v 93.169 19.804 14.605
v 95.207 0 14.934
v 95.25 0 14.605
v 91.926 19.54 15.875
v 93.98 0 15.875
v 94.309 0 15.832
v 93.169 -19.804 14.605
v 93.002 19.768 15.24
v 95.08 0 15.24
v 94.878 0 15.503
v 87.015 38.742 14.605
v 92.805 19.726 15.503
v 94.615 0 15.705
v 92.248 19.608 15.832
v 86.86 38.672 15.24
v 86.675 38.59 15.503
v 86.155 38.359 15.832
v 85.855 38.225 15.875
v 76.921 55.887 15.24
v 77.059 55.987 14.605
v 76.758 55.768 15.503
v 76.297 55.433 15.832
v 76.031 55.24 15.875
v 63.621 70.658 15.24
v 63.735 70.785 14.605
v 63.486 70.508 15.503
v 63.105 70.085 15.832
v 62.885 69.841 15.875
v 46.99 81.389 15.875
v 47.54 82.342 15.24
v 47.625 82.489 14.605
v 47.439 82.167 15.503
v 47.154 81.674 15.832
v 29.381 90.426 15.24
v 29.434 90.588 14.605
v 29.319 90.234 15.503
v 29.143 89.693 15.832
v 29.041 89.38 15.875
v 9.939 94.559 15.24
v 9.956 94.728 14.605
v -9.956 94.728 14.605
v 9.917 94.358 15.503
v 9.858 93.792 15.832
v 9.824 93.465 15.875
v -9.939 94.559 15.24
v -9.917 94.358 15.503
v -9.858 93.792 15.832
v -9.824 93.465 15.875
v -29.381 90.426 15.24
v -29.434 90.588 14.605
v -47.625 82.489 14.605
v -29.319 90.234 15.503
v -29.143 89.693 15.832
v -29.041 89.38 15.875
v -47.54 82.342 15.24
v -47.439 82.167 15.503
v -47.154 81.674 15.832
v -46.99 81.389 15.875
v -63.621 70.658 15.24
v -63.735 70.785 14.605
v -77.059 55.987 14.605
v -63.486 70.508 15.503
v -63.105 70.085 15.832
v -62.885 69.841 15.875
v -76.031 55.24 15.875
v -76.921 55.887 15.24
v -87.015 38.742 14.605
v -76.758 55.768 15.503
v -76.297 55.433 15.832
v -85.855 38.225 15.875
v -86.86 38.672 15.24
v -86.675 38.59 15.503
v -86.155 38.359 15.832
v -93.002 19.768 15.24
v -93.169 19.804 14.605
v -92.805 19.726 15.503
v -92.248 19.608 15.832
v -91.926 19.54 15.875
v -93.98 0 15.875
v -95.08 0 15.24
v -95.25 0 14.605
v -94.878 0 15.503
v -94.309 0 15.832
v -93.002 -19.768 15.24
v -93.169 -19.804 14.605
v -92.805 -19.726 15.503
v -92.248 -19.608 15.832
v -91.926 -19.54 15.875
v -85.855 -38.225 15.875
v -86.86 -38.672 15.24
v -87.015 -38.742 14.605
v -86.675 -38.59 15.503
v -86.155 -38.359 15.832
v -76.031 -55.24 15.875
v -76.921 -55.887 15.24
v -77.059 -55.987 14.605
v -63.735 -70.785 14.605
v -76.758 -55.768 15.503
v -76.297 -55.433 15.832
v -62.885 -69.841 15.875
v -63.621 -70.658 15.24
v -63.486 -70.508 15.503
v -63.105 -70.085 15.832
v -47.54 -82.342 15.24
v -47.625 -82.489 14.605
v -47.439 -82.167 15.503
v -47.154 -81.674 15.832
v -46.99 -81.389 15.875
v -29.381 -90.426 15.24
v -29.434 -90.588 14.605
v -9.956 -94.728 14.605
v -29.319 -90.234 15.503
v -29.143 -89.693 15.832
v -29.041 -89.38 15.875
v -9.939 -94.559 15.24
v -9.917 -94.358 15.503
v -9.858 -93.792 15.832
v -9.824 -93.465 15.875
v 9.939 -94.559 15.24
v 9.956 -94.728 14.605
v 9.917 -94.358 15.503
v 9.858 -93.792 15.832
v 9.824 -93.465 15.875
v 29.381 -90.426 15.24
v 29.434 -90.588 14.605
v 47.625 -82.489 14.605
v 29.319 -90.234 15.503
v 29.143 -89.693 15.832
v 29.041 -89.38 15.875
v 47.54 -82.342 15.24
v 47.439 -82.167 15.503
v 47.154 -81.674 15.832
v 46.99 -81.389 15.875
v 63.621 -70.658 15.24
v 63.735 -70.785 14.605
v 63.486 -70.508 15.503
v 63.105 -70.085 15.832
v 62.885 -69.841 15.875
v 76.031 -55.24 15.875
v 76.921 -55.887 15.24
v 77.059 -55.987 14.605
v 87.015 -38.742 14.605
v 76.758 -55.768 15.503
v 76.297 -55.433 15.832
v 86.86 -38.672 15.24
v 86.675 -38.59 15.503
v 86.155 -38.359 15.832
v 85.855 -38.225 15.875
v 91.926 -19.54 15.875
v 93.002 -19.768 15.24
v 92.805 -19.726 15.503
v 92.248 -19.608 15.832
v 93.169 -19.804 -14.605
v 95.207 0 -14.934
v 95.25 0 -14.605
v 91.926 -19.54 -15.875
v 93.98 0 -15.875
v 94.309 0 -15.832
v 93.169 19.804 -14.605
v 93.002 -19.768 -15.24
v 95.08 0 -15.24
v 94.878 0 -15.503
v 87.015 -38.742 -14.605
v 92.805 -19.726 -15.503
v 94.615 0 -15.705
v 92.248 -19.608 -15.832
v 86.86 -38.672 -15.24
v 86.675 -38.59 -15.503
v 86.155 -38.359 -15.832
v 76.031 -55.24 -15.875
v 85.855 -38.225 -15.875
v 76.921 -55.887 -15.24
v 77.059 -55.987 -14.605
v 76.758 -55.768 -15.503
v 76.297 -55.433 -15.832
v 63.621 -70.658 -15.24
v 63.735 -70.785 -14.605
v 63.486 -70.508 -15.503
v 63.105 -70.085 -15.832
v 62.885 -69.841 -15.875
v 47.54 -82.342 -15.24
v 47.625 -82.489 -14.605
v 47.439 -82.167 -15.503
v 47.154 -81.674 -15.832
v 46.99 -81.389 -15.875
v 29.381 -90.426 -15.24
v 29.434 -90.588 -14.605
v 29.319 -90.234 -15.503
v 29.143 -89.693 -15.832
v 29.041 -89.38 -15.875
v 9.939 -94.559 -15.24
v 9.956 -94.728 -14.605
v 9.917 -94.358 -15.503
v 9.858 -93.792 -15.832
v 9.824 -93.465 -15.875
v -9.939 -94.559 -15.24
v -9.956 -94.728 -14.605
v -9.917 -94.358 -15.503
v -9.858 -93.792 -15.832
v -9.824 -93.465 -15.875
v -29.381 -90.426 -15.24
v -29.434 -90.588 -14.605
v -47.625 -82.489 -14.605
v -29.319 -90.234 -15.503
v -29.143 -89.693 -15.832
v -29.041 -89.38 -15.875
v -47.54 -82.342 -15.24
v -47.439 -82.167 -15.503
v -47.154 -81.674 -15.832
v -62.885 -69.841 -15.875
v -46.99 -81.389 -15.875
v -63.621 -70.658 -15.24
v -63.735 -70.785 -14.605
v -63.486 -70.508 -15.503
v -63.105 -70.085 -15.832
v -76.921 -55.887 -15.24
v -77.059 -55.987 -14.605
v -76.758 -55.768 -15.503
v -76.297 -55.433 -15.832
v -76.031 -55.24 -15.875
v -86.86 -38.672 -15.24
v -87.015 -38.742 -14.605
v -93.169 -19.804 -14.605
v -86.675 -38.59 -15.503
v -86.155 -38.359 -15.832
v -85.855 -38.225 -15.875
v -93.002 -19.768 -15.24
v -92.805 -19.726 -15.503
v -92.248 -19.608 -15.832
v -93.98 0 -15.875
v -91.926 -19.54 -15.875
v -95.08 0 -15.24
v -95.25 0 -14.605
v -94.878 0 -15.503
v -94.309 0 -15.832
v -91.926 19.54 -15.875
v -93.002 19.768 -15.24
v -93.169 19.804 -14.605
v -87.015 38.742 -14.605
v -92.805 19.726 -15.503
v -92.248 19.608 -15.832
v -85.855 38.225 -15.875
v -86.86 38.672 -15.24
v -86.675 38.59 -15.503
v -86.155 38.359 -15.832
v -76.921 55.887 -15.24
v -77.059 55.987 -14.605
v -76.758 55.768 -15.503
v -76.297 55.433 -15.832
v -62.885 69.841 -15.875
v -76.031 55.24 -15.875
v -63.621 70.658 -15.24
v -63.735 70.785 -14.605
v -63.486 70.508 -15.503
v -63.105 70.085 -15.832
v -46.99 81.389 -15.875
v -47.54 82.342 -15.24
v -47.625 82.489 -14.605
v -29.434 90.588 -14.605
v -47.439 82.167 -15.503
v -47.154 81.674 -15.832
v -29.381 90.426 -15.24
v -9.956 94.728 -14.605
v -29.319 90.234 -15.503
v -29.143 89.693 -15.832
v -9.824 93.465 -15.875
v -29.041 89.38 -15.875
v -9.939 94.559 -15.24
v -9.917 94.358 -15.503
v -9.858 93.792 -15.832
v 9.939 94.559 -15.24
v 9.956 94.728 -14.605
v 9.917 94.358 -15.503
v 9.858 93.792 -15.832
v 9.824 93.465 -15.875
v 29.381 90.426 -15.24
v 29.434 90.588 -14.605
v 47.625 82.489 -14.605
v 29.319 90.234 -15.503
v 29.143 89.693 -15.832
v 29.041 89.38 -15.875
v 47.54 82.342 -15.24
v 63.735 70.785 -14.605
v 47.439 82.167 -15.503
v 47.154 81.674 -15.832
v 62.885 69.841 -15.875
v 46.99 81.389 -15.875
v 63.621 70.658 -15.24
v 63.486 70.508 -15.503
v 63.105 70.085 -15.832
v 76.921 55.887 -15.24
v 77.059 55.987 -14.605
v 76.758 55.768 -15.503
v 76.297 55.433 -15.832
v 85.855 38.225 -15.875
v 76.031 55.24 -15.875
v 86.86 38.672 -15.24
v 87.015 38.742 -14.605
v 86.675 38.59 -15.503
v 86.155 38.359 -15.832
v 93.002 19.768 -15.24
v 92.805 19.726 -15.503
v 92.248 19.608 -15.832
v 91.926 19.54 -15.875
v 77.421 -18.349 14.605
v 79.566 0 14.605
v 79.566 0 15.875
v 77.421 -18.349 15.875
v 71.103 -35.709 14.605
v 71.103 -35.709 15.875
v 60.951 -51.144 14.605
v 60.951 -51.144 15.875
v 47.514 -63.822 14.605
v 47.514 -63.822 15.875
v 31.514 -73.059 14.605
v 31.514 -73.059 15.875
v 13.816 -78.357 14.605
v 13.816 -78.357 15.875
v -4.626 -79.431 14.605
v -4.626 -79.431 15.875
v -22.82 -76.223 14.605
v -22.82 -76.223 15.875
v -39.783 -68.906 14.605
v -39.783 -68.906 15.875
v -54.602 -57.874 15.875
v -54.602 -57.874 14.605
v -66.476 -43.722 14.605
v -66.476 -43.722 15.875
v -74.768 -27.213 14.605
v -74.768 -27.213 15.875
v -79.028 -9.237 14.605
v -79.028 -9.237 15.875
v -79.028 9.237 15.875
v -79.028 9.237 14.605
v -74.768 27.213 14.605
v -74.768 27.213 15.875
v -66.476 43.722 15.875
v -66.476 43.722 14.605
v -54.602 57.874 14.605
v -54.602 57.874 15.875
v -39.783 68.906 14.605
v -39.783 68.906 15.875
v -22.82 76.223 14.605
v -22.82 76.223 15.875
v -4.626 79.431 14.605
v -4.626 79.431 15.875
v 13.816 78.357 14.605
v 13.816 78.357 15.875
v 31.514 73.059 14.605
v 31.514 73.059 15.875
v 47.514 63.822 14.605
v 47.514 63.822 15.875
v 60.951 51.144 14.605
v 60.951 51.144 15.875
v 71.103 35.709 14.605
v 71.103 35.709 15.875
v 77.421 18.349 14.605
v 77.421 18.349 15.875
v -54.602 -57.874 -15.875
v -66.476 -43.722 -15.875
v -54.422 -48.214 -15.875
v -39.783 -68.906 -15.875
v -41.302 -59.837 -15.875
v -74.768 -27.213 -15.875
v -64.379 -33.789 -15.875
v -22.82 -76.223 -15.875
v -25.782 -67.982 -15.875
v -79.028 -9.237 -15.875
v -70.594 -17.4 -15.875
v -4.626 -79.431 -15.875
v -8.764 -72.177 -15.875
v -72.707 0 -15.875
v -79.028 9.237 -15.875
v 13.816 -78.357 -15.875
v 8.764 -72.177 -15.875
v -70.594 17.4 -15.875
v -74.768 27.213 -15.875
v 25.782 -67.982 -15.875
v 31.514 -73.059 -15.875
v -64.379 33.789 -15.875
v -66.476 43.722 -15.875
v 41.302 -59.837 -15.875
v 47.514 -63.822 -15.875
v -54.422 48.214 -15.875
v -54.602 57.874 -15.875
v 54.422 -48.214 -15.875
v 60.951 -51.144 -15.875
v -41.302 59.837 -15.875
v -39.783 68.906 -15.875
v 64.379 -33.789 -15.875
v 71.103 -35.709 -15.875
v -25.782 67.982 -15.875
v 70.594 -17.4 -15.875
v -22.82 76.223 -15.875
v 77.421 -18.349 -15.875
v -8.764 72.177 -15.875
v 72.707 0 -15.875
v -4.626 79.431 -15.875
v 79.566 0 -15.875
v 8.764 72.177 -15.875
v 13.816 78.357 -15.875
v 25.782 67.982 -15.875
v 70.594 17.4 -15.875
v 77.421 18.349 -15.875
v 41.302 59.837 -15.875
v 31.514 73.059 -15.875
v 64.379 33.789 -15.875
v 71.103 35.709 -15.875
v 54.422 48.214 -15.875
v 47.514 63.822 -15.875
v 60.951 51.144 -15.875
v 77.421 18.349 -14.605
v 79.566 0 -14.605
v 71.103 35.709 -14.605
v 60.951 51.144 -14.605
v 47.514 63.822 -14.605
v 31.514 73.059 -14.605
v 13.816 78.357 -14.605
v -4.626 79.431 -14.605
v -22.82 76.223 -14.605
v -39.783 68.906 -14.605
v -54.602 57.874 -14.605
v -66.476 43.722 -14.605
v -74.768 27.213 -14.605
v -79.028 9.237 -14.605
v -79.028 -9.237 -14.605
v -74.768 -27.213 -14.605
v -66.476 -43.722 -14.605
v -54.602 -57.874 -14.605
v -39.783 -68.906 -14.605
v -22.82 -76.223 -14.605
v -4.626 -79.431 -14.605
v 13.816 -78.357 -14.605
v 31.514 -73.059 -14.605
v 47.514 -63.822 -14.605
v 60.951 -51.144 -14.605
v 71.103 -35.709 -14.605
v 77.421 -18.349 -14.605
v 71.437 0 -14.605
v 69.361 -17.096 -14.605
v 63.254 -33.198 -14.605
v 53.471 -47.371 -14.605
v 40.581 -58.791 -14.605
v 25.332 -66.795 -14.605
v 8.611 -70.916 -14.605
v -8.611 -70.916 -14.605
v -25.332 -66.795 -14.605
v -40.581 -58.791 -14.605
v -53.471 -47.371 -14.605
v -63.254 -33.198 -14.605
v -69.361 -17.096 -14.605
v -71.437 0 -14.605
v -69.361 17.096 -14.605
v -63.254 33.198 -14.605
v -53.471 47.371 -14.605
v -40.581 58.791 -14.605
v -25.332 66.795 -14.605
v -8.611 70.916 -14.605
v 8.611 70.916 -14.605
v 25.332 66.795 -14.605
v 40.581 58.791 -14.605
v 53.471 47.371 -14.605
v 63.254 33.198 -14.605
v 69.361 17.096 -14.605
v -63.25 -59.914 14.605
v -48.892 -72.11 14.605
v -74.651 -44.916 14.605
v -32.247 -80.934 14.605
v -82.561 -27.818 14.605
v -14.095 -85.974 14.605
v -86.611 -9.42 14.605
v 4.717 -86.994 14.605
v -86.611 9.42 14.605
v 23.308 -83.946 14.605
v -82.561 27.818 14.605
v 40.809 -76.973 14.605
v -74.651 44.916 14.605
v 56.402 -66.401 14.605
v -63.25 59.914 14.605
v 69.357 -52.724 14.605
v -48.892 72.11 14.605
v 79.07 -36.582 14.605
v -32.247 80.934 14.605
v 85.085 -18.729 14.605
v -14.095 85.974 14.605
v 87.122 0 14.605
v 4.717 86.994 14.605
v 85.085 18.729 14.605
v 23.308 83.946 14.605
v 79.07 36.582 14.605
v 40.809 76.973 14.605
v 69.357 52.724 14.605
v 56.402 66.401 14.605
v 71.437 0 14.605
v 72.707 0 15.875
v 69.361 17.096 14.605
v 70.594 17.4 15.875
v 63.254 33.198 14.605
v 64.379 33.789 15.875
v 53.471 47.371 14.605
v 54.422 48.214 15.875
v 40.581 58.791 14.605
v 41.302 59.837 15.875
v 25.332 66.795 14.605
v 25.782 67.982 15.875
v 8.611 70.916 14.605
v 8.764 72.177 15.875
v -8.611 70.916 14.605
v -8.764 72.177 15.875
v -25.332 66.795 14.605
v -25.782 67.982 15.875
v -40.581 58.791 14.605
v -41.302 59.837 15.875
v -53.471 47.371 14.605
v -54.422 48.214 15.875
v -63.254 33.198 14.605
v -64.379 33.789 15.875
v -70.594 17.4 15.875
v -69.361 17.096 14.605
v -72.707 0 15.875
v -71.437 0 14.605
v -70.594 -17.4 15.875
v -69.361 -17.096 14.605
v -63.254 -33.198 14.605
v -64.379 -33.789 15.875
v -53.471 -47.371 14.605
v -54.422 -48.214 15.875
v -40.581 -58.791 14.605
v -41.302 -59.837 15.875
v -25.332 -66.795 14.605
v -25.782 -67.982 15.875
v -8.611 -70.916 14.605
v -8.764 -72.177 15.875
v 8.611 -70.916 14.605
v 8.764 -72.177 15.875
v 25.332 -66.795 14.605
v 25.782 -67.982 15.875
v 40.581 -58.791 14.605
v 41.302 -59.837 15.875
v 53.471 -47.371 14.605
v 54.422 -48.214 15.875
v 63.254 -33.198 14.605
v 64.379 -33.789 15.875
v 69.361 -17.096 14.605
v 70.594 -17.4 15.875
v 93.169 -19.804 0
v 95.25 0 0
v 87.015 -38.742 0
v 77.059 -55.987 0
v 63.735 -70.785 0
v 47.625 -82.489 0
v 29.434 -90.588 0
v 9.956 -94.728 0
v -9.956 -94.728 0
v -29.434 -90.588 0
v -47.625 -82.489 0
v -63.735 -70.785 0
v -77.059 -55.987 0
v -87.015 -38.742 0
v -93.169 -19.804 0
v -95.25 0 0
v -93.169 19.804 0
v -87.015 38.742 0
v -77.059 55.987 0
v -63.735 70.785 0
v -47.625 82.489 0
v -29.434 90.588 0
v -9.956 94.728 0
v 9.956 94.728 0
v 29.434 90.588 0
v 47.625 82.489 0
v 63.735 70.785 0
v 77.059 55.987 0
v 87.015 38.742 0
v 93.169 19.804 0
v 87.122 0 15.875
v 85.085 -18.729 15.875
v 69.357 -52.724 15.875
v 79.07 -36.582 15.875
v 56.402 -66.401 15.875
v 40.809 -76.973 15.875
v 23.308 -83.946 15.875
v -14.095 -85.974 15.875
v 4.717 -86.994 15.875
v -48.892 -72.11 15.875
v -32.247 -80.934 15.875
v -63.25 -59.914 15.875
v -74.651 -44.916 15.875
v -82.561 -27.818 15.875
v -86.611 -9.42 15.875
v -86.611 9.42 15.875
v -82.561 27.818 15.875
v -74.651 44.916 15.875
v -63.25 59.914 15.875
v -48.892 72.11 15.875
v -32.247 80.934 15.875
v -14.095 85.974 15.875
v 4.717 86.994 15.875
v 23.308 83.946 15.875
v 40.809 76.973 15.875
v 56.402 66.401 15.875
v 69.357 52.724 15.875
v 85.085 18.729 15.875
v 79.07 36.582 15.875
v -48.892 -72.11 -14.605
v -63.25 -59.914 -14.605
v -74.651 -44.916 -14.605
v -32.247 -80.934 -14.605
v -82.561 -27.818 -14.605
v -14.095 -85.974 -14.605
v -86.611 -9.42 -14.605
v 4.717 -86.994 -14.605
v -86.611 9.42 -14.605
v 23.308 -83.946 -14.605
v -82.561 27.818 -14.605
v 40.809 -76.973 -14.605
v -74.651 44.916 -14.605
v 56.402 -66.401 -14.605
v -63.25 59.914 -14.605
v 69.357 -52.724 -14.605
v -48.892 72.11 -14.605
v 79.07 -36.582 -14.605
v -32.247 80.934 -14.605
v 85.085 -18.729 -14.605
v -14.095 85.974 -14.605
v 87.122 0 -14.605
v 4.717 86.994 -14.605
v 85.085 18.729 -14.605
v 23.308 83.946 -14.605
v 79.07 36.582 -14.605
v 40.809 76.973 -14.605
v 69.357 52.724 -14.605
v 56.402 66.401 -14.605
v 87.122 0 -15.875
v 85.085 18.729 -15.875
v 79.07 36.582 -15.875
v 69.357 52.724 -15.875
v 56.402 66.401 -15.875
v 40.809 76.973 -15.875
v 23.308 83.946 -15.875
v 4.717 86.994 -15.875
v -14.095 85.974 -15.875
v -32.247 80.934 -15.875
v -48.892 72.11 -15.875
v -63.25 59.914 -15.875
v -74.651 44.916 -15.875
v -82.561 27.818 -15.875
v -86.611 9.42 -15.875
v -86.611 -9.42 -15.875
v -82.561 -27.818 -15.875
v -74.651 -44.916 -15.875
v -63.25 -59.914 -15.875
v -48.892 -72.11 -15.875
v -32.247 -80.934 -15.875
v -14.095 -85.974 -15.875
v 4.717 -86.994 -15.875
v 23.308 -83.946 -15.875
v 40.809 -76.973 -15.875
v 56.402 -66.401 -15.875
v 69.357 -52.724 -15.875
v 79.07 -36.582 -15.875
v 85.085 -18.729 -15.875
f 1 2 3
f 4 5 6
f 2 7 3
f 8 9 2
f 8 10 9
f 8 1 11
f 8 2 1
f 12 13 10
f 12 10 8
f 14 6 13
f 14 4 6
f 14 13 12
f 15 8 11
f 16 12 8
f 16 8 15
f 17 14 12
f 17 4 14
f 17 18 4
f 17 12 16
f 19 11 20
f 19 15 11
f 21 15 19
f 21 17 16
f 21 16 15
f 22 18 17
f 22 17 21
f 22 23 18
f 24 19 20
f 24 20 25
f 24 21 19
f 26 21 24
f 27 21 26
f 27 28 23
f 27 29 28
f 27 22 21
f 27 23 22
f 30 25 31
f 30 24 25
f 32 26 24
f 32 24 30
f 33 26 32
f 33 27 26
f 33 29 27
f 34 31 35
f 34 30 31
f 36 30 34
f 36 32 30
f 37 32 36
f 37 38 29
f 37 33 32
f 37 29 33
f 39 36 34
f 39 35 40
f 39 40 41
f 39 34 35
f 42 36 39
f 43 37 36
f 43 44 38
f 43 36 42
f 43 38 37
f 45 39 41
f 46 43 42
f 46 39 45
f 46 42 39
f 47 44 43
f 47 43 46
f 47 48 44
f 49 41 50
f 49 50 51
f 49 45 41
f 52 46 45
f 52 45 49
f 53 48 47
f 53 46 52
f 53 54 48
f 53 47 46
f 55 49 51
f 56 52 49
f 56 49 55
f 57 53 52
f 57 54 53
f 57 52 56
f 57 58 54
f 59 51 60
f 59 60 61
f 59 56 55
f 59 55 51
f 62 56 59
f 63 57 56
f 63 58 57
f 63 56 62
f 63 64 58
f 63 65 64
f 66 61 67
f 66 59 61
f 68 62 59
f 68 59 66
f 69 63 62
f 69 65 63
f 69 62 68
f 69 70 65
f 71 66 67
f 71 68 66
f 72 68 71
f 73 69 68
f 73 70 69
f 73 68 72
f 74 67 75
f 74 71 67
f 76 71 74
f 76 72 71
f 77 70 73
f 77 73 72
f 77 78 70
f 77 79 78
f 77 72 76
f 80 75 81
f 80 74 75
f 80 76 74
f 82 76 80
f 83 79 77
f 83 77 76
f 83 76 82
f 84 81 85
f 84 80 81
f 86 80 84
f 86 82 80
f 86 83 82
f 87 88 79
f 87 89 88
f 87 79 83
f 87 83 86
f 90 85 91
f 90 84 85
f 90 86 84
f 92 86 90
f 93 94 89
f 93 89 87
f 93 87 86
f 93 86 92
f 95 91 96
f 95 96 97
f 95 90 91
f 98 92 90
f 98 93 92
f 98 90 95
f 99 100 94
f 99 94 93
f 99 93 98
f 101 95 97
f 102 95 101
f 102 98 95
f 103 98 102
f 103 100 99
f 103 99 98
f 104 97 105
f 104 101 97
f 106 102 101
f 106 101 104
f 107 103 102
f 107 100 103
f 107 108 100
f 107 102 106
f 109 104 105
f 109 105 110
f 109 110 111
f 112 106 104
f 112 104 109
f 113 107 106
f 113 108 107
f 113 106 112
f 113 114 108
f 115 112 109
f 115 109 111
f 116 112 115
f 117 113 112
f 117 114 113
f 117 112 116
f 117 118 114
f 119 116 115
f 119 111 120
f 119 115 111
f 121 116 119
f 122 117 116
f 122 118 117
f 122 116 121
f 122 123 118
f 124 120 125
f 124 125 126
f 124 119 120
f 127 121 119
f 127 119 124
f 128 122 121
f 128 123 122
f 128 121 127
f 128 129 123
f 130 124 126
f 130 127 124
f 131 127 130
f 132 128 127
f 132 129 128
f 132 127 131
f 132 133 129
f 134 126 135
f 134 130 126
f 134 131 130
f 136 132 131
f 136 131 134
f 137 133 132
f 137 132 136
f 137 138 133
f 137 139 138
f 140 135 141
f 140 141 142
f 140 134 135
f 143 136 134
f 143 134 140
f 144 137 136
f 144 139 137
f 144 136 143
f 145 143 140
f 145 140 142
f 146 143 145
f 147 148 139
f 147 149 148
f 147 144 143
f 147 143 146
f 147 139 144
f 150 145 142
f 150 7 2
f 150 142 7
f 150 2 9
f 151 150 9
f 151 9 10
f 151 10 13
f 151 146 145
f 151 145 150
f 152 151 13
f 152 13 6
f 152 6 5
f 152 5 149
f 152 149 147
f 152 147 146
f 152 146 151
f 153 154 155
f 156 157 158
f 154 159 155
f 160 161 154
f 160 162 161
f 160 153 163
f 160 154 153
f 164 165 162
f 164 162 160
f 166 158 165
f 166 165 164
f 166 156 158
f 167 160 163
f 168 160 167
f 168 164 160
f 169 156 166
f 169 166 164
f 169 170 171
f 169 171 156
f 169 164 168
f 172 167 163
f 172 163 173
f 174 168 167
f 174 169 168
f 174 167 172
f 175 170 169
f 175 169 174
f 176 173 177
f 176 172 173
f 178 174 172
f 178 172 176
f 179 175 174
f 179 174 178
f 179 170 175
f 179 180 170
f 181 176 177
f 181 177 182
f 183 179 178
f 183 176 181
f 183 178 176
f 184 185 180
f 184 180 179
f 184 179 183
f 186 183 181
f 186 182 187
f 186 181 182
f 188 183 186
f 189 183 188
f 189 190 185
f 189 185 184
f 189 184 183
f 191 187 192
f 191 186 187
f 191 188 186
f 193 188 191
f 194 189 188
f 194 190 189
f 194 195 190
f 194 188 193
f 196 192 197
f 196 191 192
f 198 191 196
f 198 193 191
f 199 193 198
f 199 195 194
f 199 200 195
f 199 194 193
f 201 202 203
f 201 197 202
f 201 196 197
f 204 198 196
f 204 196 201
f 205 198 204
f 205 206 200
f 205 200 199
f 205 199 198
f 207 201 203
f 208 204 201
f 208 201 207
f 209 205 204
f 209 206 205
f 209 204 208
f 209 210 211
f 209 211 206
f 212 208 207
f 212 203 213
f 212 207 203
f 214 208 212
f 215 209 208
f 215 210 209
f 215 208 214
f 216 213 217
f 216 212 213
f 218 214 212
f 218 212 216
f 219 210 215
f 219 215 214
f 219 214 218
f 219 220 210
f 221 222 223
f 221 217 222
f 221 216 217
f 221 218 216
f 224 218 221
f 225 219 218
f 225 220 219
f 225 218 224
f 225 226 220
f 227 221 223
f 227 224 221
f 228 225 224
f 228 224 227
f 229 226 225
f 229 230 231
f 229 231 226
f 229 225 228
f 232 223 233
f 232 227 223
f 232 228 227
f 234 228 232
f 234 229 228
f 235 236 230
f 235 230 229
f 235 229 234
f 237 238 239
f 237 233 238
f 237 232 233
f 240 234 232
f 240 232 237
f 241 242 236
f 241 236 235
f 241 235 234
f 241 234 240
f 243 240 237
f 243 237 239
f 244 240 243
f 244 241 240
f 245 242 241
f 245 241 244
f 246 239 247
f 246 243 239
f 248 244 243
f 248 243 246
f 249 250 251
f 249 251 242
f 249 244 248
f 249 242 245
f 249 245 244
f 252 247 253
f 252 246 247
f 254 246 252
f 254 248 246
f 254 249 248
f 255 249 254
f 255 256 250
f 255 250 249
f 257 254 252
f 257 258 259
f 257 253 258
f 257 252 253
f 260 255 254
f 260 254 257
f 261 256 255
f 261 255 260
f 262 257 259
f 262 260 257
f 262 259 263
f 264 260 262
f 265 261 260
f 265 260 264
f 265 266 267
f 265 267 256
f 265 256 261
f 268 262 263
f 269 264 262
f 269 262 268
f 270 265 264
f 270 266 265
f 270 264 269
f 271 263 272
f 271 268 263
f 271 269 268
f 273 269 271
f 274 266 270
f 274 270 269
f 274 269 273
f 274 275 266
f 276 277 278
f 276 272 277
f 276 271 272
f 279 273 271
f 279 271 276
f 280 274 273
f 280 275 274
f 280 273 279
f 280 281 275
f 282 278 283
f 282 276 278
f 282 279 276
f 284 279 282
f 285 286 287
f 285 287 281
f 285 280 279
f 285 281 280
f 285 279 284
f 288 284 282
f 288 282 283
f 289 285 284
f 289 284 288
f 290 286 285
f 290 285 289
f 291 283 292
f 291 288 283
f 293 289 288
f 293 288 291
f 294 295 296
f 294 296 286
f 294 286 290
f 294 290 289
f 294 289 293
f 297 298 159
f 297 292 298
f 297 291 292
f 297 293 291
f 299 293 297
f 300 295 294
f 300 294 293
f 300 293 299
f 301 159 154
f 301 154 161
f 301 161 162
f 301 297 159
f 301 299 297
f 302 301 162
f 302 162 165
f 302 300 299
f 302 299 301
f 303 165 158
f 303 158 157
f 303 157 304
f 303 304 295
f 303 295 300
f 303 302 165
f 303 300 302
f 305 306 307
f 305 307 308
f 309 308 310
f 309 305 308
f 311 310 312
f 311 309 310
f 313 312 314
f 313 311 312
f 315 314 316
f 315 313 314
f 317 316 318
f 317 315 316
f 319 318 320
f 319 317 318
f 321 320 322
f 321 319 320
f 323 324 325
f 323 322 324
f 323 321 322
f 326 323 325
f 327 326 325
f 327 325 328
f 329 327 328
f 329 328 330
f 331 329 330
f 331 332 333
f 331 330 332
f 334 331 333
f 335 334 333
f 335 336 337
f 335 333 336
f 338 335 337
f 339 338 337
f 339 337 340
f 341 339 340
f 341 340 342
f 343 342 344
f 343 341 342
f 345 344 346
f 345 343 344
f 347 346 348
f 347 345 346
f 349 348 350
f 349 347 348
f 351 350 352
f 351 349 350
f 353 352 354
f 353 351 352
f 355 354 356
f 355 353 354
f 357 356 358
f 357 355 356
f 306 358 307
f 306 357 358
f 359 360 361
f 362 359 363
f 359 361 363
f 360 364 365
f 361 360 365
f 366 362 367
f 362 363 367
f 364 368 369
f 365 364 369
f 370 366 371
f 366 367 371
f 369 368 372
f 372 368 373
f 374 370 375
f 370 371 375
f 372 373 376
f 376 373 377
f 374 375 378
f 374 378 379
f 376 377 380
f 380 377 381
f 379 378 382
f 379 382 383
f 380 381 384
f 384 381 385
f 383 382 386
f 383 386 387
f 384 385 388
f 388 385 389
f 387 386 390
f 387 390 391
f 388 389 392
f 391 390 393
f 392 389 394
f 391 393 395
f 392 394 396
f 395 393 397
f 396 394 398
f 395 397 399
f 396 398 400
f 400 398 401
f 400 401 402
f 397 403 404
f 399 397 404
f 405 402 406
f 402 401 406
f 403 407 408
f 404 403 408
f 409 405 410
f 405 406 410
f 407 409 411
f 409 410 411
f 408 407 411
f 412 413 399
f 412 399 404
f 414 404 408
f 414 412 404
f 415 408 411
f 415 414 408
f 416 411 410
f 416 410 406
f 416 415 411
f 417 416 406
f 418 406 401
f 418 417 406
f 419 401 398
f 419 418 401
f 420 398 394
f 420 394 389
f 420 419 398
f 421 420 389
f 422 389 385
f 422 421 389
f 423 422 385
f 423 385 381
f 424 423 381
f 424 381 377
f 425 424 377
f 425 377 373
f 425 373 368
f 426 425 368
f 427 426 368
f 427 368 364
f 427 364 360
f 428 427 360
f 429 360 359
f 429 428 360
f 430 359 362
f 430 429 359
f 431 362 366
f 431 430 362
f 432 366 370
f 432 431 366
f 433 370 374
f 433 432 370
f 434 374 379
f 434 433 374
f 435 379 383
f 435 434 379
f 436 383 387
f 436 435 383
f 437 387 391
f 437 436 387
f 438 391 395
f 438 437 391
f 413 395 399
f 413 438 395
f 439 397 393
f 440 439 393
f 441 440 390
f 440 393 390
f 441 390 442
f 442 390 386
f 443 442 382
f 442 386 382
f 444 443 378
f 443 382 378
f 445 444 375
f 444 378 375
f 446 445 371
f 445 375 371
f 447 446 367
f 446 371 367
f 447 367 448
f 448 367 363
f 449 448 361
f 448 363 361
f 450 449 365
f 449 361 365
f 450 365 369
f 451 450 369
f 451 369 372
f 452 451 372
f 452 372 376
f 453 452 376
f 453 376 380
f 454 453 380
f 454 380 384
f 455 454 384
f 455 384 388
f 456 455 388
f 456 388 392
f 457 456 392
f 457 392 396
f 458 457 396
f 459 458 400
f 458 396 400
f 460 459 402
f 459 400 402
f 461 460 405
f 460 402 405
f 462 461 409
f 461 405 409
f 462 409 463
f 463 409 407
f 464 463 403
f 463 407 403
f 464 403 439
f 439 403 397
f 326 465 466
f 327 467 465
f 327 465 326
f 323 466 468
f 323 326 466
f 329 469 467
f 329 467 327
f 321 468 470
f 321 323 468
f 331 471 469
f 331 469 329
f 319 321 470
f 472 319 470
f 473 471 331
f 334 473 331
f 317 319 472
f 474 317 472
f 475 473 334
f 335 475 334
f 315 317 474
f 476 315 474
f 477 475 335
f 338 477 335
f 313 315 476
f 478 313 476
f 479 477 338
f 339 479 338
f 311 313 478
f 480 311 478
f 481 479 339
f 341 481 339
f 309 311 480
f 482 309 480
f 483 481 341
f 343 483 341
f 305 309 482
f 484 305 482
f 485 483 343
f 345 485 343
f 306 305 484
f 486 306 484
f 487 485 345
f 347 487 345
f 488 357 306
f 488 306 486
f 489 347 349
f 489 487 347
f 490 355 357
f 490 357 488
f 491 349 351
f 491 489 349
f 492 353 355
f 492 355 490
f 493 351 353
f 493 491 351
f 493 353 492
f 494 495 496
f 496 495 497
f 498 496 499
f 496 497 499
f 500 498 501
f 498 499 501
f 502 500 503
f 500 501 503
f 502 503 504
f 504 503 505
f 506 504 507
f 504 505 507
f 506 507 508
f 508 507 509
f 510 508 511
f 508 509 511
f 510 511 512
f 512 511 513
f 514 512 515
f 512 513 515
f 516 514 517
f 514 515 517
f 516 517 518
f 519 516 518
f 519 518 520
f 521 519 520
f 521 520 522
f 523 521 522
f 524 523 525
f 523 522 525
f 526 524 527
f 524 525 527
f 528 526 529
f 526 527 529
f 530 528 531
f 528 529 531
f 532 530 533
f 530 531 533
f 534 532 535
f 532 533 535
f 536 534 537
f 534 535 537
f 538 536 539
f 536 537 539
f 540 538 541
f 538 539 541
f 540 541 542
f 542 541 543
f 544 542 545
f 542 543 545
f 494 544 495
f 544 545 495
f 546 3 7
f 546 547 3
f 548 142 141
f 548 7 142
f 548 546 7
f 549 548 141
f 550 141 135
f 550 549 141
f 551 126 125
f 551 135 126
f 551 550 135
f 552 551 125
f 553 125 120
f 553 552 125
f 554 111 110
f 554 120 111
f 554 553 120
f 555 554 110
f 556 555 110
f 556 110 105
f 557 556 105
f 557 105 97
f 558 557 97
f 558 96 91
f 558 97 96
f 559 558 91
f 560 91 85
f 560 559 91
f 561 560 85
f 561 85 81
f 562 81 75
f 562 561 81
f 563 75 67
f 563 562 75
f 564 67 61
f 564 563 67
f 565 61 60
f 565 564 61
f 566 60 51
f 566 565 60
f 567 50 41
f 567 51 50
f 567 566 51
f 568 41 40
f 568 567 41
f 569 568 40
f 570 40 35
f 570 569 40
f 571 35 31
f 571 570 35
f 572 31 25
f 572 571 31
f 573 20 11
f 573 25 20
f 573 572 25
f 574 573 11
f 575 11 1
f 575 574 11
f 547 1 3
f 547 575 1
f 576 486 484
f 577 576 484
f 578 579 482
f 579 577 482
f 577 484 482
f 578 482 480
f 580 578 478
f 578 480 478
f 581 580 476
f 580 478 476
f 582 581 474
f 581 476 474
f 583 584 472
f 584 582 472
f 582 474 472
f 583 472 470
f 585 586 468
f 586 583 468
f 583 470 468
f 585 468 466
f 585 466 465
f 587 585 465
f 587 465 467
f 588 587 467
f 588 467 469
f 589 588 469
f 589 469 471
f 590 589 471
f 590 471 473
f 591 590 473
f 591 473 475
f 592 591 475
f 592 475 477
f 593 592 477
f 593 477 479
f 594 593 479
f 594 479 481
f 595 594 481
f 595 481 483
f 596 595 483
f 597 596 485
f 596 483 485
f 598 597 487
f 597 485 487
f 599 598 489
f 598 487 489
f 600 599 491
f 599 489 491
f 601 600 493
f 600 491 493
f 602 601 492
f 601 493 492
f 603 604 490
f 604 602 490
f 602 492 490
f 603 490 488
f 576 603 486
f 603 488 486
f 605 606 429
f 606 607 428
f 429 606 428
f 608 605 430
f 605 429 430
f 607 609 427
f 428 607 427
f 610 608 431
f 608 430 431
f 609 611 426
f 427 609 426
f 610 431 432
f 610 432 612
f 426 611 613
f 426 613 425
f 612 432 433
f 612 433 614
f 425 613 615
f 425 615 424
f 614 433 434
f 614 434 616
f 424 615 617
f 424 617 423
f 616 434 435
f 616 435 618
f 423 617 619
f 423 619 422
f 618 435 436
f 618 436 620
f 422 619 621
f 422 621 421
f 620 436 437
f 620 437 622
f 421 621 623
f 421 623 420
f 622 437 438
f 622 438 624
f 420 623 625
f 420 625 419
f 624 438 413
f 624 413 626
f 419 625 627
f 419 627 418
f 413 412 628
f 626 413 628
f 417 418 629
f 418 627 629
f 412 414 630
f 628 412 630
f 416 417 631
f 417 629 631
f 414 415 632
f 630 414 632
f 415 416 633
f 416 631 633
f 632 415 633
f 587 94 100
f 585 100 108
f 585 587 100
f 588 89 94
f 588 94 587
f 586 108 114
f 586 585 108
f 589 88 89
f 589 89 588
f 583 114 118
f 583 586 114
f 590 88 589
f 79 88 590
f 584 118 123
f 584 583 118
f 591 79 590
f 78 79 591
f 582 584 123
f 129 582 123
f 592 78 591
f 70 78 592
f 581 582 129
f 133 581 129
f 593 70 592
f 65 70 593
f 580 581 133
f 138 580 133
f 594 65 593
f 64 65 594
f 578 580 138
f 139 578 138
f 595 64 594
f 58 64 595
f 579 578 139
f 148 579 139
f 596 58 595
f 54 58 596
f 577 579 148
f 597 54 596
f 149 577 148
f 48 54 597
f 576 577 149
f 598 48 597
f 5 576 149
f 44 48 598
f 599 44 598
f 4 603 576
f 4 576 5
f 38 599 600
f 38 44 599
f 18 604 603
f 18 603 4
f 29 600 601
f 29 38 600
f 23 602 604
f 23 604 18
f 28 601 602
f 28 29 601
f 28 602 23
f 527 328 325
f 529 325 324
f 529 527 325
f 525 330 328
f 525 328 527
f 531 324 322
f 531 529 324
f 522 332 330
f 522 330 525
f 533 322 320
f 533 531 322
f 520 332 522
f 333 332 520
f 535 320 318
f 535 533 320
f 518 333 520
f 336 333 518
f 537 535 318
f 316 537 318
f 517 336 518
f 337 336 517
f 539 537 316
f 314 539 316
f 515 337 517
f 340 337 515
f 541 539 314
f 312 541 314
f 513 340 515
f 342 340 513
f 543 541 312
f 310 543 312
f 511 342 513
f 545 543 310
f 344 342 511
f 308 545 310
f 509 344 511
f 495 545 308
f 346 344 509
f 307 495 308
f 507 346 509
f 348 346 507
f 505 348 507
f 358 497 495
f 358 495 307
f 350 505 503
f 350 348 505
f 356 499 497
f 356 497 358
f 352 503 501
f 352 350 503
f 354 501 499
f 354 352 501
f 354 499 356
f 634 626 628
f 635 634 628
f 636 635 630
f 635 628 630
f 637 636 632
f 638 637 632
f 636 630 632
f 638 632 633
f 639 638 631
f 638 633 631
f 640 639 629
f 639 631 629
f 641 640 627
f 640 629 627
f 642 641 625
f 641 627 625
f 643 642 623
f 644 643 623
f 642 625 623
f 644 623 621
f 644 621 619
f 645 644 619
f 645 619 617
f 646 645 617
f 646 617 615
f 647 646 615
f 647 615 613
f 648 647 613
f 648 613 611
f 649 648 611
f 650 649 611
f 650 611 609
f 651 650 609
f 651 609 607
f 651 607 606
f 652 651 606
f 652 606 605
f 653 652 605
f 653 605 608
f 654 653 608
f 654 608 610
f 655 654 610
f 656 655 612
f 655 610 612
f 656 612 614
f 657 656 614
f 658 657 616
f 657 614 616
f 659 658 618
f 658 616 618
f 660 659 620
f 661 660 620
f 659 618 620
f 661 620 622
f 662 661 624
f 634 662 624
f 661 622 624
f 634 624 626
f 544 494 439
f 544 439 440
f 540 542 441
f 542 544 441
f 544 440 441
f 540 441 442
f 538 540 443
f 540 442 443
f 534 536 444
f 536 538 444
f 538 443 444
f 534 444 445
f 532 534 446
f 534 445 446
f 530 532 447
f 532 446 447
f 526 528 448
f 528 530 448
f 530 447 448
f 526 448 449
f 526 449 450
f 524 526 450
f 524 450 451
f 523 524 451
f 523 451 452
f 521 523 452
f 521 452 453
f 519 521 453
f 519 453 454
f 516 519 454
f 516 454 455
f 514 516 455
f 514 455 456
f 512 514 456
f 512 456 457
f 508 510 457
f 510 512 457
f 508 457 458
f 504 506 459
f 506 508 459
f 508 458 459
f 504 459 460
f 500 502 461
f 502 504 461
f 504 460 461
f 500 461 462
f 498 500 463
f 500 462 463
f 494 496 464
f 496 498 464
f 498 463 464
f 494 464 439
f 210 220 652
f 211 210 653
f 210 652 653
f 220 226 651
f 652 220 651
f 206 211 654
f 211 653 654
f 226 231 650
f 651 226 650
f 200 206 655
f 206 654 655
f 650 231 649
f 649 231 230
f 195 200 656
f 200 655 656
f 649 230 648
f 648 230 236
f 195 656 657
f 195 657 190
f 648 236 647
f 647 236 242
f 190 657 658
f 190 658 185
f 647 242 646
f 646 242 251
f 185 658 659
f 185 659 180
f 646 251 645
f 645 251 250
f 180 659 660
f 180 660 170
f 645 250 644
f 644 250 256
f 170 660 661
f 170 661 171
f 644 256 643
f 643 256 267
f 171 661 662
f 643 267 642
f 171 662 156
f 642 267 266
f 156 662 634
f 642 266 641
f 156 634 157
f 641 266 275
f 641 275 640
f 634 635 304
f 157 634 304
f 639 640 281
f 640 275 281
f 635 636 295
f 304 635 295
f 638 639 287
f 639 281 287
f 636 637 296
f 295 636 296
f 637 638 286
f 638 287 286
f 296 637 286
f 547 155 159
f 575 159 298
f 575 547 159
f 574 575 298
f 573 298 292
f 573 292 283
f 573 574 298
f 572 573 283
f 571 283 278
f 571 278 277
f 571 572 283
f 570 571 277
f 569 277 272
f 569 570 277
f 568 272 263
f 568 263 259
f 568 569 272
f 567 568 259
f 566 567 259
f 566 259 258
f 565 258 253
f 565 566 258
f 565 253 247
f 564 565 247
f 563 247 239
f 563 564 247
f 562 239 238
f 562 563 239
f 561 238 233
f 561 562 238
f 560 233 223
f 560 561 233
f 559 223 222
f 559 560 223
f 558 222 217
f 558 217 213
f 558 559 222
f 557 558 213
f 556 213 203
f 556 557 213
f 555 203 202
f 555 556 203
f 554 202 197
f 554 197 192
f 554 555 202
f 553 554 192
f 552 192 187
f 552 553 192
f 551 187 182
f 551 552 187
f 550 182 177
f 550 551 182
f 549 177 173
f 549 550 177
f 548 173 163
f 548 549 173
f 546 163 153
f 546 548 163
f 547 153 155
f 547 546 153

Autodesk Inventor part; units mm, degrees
ref_plane "YZ Plane" through (0, 0, 0) normal (1, 0, 0) x (0, 1, 0)
ref_plane "XZ Plane" through (0, 0, 0) normal (0, 1, 0) x (-1, 0, 0)
ref_plane "XY Plane" through (0, 0, 0) normal (0, 0, 1) x (1, 0, 0)
sketch "Sketch1" plane through (0, 0, 0) normal (0, 0, 1) x (1, 0, 0)
  circle A0 centre (0, 0) radius 7.1437
  circle A1 centre (0, 0) radius 9.525
  circle A2 centre (0, 0) radius 7.9566
  circle A3 centre (0, 0) radius 8.7122
  dimension "d0" = 14.2875
  dimension "d1" = 19.05
  dimension "d2" = 0.8128
  dimension "d3" = 0.8128
extrude "Extrusion1" add sketch "Sketch1" along normal mid plane 3.175
fillet "Fillet1" radius 0.127 2 edges at (-9.525, 0, 1.5875) (-9.525, 0, -1.5875)
chamfer "Chamfer1" distance 0.127 angle 45 2 edges at (-7.1437, 0, 1.5875) (-7.1437, 0, -1.5875)
sketch "Sketch2" plane through (0, 0, 0) normal (0, 0, 1) x (1, 0, 0)
  circle A0 centre (0, 0) radius 8.7122
  circle A1 centre (0, 0) radius 7.9566
extrude "Extrusion2" add sketch "Sketch2" along normal mid plane 2.921
scale "Scale1" factors (10, 10, 10) then translate (0, 0, 0) bodies 1
properties part number "front hub bearing"
